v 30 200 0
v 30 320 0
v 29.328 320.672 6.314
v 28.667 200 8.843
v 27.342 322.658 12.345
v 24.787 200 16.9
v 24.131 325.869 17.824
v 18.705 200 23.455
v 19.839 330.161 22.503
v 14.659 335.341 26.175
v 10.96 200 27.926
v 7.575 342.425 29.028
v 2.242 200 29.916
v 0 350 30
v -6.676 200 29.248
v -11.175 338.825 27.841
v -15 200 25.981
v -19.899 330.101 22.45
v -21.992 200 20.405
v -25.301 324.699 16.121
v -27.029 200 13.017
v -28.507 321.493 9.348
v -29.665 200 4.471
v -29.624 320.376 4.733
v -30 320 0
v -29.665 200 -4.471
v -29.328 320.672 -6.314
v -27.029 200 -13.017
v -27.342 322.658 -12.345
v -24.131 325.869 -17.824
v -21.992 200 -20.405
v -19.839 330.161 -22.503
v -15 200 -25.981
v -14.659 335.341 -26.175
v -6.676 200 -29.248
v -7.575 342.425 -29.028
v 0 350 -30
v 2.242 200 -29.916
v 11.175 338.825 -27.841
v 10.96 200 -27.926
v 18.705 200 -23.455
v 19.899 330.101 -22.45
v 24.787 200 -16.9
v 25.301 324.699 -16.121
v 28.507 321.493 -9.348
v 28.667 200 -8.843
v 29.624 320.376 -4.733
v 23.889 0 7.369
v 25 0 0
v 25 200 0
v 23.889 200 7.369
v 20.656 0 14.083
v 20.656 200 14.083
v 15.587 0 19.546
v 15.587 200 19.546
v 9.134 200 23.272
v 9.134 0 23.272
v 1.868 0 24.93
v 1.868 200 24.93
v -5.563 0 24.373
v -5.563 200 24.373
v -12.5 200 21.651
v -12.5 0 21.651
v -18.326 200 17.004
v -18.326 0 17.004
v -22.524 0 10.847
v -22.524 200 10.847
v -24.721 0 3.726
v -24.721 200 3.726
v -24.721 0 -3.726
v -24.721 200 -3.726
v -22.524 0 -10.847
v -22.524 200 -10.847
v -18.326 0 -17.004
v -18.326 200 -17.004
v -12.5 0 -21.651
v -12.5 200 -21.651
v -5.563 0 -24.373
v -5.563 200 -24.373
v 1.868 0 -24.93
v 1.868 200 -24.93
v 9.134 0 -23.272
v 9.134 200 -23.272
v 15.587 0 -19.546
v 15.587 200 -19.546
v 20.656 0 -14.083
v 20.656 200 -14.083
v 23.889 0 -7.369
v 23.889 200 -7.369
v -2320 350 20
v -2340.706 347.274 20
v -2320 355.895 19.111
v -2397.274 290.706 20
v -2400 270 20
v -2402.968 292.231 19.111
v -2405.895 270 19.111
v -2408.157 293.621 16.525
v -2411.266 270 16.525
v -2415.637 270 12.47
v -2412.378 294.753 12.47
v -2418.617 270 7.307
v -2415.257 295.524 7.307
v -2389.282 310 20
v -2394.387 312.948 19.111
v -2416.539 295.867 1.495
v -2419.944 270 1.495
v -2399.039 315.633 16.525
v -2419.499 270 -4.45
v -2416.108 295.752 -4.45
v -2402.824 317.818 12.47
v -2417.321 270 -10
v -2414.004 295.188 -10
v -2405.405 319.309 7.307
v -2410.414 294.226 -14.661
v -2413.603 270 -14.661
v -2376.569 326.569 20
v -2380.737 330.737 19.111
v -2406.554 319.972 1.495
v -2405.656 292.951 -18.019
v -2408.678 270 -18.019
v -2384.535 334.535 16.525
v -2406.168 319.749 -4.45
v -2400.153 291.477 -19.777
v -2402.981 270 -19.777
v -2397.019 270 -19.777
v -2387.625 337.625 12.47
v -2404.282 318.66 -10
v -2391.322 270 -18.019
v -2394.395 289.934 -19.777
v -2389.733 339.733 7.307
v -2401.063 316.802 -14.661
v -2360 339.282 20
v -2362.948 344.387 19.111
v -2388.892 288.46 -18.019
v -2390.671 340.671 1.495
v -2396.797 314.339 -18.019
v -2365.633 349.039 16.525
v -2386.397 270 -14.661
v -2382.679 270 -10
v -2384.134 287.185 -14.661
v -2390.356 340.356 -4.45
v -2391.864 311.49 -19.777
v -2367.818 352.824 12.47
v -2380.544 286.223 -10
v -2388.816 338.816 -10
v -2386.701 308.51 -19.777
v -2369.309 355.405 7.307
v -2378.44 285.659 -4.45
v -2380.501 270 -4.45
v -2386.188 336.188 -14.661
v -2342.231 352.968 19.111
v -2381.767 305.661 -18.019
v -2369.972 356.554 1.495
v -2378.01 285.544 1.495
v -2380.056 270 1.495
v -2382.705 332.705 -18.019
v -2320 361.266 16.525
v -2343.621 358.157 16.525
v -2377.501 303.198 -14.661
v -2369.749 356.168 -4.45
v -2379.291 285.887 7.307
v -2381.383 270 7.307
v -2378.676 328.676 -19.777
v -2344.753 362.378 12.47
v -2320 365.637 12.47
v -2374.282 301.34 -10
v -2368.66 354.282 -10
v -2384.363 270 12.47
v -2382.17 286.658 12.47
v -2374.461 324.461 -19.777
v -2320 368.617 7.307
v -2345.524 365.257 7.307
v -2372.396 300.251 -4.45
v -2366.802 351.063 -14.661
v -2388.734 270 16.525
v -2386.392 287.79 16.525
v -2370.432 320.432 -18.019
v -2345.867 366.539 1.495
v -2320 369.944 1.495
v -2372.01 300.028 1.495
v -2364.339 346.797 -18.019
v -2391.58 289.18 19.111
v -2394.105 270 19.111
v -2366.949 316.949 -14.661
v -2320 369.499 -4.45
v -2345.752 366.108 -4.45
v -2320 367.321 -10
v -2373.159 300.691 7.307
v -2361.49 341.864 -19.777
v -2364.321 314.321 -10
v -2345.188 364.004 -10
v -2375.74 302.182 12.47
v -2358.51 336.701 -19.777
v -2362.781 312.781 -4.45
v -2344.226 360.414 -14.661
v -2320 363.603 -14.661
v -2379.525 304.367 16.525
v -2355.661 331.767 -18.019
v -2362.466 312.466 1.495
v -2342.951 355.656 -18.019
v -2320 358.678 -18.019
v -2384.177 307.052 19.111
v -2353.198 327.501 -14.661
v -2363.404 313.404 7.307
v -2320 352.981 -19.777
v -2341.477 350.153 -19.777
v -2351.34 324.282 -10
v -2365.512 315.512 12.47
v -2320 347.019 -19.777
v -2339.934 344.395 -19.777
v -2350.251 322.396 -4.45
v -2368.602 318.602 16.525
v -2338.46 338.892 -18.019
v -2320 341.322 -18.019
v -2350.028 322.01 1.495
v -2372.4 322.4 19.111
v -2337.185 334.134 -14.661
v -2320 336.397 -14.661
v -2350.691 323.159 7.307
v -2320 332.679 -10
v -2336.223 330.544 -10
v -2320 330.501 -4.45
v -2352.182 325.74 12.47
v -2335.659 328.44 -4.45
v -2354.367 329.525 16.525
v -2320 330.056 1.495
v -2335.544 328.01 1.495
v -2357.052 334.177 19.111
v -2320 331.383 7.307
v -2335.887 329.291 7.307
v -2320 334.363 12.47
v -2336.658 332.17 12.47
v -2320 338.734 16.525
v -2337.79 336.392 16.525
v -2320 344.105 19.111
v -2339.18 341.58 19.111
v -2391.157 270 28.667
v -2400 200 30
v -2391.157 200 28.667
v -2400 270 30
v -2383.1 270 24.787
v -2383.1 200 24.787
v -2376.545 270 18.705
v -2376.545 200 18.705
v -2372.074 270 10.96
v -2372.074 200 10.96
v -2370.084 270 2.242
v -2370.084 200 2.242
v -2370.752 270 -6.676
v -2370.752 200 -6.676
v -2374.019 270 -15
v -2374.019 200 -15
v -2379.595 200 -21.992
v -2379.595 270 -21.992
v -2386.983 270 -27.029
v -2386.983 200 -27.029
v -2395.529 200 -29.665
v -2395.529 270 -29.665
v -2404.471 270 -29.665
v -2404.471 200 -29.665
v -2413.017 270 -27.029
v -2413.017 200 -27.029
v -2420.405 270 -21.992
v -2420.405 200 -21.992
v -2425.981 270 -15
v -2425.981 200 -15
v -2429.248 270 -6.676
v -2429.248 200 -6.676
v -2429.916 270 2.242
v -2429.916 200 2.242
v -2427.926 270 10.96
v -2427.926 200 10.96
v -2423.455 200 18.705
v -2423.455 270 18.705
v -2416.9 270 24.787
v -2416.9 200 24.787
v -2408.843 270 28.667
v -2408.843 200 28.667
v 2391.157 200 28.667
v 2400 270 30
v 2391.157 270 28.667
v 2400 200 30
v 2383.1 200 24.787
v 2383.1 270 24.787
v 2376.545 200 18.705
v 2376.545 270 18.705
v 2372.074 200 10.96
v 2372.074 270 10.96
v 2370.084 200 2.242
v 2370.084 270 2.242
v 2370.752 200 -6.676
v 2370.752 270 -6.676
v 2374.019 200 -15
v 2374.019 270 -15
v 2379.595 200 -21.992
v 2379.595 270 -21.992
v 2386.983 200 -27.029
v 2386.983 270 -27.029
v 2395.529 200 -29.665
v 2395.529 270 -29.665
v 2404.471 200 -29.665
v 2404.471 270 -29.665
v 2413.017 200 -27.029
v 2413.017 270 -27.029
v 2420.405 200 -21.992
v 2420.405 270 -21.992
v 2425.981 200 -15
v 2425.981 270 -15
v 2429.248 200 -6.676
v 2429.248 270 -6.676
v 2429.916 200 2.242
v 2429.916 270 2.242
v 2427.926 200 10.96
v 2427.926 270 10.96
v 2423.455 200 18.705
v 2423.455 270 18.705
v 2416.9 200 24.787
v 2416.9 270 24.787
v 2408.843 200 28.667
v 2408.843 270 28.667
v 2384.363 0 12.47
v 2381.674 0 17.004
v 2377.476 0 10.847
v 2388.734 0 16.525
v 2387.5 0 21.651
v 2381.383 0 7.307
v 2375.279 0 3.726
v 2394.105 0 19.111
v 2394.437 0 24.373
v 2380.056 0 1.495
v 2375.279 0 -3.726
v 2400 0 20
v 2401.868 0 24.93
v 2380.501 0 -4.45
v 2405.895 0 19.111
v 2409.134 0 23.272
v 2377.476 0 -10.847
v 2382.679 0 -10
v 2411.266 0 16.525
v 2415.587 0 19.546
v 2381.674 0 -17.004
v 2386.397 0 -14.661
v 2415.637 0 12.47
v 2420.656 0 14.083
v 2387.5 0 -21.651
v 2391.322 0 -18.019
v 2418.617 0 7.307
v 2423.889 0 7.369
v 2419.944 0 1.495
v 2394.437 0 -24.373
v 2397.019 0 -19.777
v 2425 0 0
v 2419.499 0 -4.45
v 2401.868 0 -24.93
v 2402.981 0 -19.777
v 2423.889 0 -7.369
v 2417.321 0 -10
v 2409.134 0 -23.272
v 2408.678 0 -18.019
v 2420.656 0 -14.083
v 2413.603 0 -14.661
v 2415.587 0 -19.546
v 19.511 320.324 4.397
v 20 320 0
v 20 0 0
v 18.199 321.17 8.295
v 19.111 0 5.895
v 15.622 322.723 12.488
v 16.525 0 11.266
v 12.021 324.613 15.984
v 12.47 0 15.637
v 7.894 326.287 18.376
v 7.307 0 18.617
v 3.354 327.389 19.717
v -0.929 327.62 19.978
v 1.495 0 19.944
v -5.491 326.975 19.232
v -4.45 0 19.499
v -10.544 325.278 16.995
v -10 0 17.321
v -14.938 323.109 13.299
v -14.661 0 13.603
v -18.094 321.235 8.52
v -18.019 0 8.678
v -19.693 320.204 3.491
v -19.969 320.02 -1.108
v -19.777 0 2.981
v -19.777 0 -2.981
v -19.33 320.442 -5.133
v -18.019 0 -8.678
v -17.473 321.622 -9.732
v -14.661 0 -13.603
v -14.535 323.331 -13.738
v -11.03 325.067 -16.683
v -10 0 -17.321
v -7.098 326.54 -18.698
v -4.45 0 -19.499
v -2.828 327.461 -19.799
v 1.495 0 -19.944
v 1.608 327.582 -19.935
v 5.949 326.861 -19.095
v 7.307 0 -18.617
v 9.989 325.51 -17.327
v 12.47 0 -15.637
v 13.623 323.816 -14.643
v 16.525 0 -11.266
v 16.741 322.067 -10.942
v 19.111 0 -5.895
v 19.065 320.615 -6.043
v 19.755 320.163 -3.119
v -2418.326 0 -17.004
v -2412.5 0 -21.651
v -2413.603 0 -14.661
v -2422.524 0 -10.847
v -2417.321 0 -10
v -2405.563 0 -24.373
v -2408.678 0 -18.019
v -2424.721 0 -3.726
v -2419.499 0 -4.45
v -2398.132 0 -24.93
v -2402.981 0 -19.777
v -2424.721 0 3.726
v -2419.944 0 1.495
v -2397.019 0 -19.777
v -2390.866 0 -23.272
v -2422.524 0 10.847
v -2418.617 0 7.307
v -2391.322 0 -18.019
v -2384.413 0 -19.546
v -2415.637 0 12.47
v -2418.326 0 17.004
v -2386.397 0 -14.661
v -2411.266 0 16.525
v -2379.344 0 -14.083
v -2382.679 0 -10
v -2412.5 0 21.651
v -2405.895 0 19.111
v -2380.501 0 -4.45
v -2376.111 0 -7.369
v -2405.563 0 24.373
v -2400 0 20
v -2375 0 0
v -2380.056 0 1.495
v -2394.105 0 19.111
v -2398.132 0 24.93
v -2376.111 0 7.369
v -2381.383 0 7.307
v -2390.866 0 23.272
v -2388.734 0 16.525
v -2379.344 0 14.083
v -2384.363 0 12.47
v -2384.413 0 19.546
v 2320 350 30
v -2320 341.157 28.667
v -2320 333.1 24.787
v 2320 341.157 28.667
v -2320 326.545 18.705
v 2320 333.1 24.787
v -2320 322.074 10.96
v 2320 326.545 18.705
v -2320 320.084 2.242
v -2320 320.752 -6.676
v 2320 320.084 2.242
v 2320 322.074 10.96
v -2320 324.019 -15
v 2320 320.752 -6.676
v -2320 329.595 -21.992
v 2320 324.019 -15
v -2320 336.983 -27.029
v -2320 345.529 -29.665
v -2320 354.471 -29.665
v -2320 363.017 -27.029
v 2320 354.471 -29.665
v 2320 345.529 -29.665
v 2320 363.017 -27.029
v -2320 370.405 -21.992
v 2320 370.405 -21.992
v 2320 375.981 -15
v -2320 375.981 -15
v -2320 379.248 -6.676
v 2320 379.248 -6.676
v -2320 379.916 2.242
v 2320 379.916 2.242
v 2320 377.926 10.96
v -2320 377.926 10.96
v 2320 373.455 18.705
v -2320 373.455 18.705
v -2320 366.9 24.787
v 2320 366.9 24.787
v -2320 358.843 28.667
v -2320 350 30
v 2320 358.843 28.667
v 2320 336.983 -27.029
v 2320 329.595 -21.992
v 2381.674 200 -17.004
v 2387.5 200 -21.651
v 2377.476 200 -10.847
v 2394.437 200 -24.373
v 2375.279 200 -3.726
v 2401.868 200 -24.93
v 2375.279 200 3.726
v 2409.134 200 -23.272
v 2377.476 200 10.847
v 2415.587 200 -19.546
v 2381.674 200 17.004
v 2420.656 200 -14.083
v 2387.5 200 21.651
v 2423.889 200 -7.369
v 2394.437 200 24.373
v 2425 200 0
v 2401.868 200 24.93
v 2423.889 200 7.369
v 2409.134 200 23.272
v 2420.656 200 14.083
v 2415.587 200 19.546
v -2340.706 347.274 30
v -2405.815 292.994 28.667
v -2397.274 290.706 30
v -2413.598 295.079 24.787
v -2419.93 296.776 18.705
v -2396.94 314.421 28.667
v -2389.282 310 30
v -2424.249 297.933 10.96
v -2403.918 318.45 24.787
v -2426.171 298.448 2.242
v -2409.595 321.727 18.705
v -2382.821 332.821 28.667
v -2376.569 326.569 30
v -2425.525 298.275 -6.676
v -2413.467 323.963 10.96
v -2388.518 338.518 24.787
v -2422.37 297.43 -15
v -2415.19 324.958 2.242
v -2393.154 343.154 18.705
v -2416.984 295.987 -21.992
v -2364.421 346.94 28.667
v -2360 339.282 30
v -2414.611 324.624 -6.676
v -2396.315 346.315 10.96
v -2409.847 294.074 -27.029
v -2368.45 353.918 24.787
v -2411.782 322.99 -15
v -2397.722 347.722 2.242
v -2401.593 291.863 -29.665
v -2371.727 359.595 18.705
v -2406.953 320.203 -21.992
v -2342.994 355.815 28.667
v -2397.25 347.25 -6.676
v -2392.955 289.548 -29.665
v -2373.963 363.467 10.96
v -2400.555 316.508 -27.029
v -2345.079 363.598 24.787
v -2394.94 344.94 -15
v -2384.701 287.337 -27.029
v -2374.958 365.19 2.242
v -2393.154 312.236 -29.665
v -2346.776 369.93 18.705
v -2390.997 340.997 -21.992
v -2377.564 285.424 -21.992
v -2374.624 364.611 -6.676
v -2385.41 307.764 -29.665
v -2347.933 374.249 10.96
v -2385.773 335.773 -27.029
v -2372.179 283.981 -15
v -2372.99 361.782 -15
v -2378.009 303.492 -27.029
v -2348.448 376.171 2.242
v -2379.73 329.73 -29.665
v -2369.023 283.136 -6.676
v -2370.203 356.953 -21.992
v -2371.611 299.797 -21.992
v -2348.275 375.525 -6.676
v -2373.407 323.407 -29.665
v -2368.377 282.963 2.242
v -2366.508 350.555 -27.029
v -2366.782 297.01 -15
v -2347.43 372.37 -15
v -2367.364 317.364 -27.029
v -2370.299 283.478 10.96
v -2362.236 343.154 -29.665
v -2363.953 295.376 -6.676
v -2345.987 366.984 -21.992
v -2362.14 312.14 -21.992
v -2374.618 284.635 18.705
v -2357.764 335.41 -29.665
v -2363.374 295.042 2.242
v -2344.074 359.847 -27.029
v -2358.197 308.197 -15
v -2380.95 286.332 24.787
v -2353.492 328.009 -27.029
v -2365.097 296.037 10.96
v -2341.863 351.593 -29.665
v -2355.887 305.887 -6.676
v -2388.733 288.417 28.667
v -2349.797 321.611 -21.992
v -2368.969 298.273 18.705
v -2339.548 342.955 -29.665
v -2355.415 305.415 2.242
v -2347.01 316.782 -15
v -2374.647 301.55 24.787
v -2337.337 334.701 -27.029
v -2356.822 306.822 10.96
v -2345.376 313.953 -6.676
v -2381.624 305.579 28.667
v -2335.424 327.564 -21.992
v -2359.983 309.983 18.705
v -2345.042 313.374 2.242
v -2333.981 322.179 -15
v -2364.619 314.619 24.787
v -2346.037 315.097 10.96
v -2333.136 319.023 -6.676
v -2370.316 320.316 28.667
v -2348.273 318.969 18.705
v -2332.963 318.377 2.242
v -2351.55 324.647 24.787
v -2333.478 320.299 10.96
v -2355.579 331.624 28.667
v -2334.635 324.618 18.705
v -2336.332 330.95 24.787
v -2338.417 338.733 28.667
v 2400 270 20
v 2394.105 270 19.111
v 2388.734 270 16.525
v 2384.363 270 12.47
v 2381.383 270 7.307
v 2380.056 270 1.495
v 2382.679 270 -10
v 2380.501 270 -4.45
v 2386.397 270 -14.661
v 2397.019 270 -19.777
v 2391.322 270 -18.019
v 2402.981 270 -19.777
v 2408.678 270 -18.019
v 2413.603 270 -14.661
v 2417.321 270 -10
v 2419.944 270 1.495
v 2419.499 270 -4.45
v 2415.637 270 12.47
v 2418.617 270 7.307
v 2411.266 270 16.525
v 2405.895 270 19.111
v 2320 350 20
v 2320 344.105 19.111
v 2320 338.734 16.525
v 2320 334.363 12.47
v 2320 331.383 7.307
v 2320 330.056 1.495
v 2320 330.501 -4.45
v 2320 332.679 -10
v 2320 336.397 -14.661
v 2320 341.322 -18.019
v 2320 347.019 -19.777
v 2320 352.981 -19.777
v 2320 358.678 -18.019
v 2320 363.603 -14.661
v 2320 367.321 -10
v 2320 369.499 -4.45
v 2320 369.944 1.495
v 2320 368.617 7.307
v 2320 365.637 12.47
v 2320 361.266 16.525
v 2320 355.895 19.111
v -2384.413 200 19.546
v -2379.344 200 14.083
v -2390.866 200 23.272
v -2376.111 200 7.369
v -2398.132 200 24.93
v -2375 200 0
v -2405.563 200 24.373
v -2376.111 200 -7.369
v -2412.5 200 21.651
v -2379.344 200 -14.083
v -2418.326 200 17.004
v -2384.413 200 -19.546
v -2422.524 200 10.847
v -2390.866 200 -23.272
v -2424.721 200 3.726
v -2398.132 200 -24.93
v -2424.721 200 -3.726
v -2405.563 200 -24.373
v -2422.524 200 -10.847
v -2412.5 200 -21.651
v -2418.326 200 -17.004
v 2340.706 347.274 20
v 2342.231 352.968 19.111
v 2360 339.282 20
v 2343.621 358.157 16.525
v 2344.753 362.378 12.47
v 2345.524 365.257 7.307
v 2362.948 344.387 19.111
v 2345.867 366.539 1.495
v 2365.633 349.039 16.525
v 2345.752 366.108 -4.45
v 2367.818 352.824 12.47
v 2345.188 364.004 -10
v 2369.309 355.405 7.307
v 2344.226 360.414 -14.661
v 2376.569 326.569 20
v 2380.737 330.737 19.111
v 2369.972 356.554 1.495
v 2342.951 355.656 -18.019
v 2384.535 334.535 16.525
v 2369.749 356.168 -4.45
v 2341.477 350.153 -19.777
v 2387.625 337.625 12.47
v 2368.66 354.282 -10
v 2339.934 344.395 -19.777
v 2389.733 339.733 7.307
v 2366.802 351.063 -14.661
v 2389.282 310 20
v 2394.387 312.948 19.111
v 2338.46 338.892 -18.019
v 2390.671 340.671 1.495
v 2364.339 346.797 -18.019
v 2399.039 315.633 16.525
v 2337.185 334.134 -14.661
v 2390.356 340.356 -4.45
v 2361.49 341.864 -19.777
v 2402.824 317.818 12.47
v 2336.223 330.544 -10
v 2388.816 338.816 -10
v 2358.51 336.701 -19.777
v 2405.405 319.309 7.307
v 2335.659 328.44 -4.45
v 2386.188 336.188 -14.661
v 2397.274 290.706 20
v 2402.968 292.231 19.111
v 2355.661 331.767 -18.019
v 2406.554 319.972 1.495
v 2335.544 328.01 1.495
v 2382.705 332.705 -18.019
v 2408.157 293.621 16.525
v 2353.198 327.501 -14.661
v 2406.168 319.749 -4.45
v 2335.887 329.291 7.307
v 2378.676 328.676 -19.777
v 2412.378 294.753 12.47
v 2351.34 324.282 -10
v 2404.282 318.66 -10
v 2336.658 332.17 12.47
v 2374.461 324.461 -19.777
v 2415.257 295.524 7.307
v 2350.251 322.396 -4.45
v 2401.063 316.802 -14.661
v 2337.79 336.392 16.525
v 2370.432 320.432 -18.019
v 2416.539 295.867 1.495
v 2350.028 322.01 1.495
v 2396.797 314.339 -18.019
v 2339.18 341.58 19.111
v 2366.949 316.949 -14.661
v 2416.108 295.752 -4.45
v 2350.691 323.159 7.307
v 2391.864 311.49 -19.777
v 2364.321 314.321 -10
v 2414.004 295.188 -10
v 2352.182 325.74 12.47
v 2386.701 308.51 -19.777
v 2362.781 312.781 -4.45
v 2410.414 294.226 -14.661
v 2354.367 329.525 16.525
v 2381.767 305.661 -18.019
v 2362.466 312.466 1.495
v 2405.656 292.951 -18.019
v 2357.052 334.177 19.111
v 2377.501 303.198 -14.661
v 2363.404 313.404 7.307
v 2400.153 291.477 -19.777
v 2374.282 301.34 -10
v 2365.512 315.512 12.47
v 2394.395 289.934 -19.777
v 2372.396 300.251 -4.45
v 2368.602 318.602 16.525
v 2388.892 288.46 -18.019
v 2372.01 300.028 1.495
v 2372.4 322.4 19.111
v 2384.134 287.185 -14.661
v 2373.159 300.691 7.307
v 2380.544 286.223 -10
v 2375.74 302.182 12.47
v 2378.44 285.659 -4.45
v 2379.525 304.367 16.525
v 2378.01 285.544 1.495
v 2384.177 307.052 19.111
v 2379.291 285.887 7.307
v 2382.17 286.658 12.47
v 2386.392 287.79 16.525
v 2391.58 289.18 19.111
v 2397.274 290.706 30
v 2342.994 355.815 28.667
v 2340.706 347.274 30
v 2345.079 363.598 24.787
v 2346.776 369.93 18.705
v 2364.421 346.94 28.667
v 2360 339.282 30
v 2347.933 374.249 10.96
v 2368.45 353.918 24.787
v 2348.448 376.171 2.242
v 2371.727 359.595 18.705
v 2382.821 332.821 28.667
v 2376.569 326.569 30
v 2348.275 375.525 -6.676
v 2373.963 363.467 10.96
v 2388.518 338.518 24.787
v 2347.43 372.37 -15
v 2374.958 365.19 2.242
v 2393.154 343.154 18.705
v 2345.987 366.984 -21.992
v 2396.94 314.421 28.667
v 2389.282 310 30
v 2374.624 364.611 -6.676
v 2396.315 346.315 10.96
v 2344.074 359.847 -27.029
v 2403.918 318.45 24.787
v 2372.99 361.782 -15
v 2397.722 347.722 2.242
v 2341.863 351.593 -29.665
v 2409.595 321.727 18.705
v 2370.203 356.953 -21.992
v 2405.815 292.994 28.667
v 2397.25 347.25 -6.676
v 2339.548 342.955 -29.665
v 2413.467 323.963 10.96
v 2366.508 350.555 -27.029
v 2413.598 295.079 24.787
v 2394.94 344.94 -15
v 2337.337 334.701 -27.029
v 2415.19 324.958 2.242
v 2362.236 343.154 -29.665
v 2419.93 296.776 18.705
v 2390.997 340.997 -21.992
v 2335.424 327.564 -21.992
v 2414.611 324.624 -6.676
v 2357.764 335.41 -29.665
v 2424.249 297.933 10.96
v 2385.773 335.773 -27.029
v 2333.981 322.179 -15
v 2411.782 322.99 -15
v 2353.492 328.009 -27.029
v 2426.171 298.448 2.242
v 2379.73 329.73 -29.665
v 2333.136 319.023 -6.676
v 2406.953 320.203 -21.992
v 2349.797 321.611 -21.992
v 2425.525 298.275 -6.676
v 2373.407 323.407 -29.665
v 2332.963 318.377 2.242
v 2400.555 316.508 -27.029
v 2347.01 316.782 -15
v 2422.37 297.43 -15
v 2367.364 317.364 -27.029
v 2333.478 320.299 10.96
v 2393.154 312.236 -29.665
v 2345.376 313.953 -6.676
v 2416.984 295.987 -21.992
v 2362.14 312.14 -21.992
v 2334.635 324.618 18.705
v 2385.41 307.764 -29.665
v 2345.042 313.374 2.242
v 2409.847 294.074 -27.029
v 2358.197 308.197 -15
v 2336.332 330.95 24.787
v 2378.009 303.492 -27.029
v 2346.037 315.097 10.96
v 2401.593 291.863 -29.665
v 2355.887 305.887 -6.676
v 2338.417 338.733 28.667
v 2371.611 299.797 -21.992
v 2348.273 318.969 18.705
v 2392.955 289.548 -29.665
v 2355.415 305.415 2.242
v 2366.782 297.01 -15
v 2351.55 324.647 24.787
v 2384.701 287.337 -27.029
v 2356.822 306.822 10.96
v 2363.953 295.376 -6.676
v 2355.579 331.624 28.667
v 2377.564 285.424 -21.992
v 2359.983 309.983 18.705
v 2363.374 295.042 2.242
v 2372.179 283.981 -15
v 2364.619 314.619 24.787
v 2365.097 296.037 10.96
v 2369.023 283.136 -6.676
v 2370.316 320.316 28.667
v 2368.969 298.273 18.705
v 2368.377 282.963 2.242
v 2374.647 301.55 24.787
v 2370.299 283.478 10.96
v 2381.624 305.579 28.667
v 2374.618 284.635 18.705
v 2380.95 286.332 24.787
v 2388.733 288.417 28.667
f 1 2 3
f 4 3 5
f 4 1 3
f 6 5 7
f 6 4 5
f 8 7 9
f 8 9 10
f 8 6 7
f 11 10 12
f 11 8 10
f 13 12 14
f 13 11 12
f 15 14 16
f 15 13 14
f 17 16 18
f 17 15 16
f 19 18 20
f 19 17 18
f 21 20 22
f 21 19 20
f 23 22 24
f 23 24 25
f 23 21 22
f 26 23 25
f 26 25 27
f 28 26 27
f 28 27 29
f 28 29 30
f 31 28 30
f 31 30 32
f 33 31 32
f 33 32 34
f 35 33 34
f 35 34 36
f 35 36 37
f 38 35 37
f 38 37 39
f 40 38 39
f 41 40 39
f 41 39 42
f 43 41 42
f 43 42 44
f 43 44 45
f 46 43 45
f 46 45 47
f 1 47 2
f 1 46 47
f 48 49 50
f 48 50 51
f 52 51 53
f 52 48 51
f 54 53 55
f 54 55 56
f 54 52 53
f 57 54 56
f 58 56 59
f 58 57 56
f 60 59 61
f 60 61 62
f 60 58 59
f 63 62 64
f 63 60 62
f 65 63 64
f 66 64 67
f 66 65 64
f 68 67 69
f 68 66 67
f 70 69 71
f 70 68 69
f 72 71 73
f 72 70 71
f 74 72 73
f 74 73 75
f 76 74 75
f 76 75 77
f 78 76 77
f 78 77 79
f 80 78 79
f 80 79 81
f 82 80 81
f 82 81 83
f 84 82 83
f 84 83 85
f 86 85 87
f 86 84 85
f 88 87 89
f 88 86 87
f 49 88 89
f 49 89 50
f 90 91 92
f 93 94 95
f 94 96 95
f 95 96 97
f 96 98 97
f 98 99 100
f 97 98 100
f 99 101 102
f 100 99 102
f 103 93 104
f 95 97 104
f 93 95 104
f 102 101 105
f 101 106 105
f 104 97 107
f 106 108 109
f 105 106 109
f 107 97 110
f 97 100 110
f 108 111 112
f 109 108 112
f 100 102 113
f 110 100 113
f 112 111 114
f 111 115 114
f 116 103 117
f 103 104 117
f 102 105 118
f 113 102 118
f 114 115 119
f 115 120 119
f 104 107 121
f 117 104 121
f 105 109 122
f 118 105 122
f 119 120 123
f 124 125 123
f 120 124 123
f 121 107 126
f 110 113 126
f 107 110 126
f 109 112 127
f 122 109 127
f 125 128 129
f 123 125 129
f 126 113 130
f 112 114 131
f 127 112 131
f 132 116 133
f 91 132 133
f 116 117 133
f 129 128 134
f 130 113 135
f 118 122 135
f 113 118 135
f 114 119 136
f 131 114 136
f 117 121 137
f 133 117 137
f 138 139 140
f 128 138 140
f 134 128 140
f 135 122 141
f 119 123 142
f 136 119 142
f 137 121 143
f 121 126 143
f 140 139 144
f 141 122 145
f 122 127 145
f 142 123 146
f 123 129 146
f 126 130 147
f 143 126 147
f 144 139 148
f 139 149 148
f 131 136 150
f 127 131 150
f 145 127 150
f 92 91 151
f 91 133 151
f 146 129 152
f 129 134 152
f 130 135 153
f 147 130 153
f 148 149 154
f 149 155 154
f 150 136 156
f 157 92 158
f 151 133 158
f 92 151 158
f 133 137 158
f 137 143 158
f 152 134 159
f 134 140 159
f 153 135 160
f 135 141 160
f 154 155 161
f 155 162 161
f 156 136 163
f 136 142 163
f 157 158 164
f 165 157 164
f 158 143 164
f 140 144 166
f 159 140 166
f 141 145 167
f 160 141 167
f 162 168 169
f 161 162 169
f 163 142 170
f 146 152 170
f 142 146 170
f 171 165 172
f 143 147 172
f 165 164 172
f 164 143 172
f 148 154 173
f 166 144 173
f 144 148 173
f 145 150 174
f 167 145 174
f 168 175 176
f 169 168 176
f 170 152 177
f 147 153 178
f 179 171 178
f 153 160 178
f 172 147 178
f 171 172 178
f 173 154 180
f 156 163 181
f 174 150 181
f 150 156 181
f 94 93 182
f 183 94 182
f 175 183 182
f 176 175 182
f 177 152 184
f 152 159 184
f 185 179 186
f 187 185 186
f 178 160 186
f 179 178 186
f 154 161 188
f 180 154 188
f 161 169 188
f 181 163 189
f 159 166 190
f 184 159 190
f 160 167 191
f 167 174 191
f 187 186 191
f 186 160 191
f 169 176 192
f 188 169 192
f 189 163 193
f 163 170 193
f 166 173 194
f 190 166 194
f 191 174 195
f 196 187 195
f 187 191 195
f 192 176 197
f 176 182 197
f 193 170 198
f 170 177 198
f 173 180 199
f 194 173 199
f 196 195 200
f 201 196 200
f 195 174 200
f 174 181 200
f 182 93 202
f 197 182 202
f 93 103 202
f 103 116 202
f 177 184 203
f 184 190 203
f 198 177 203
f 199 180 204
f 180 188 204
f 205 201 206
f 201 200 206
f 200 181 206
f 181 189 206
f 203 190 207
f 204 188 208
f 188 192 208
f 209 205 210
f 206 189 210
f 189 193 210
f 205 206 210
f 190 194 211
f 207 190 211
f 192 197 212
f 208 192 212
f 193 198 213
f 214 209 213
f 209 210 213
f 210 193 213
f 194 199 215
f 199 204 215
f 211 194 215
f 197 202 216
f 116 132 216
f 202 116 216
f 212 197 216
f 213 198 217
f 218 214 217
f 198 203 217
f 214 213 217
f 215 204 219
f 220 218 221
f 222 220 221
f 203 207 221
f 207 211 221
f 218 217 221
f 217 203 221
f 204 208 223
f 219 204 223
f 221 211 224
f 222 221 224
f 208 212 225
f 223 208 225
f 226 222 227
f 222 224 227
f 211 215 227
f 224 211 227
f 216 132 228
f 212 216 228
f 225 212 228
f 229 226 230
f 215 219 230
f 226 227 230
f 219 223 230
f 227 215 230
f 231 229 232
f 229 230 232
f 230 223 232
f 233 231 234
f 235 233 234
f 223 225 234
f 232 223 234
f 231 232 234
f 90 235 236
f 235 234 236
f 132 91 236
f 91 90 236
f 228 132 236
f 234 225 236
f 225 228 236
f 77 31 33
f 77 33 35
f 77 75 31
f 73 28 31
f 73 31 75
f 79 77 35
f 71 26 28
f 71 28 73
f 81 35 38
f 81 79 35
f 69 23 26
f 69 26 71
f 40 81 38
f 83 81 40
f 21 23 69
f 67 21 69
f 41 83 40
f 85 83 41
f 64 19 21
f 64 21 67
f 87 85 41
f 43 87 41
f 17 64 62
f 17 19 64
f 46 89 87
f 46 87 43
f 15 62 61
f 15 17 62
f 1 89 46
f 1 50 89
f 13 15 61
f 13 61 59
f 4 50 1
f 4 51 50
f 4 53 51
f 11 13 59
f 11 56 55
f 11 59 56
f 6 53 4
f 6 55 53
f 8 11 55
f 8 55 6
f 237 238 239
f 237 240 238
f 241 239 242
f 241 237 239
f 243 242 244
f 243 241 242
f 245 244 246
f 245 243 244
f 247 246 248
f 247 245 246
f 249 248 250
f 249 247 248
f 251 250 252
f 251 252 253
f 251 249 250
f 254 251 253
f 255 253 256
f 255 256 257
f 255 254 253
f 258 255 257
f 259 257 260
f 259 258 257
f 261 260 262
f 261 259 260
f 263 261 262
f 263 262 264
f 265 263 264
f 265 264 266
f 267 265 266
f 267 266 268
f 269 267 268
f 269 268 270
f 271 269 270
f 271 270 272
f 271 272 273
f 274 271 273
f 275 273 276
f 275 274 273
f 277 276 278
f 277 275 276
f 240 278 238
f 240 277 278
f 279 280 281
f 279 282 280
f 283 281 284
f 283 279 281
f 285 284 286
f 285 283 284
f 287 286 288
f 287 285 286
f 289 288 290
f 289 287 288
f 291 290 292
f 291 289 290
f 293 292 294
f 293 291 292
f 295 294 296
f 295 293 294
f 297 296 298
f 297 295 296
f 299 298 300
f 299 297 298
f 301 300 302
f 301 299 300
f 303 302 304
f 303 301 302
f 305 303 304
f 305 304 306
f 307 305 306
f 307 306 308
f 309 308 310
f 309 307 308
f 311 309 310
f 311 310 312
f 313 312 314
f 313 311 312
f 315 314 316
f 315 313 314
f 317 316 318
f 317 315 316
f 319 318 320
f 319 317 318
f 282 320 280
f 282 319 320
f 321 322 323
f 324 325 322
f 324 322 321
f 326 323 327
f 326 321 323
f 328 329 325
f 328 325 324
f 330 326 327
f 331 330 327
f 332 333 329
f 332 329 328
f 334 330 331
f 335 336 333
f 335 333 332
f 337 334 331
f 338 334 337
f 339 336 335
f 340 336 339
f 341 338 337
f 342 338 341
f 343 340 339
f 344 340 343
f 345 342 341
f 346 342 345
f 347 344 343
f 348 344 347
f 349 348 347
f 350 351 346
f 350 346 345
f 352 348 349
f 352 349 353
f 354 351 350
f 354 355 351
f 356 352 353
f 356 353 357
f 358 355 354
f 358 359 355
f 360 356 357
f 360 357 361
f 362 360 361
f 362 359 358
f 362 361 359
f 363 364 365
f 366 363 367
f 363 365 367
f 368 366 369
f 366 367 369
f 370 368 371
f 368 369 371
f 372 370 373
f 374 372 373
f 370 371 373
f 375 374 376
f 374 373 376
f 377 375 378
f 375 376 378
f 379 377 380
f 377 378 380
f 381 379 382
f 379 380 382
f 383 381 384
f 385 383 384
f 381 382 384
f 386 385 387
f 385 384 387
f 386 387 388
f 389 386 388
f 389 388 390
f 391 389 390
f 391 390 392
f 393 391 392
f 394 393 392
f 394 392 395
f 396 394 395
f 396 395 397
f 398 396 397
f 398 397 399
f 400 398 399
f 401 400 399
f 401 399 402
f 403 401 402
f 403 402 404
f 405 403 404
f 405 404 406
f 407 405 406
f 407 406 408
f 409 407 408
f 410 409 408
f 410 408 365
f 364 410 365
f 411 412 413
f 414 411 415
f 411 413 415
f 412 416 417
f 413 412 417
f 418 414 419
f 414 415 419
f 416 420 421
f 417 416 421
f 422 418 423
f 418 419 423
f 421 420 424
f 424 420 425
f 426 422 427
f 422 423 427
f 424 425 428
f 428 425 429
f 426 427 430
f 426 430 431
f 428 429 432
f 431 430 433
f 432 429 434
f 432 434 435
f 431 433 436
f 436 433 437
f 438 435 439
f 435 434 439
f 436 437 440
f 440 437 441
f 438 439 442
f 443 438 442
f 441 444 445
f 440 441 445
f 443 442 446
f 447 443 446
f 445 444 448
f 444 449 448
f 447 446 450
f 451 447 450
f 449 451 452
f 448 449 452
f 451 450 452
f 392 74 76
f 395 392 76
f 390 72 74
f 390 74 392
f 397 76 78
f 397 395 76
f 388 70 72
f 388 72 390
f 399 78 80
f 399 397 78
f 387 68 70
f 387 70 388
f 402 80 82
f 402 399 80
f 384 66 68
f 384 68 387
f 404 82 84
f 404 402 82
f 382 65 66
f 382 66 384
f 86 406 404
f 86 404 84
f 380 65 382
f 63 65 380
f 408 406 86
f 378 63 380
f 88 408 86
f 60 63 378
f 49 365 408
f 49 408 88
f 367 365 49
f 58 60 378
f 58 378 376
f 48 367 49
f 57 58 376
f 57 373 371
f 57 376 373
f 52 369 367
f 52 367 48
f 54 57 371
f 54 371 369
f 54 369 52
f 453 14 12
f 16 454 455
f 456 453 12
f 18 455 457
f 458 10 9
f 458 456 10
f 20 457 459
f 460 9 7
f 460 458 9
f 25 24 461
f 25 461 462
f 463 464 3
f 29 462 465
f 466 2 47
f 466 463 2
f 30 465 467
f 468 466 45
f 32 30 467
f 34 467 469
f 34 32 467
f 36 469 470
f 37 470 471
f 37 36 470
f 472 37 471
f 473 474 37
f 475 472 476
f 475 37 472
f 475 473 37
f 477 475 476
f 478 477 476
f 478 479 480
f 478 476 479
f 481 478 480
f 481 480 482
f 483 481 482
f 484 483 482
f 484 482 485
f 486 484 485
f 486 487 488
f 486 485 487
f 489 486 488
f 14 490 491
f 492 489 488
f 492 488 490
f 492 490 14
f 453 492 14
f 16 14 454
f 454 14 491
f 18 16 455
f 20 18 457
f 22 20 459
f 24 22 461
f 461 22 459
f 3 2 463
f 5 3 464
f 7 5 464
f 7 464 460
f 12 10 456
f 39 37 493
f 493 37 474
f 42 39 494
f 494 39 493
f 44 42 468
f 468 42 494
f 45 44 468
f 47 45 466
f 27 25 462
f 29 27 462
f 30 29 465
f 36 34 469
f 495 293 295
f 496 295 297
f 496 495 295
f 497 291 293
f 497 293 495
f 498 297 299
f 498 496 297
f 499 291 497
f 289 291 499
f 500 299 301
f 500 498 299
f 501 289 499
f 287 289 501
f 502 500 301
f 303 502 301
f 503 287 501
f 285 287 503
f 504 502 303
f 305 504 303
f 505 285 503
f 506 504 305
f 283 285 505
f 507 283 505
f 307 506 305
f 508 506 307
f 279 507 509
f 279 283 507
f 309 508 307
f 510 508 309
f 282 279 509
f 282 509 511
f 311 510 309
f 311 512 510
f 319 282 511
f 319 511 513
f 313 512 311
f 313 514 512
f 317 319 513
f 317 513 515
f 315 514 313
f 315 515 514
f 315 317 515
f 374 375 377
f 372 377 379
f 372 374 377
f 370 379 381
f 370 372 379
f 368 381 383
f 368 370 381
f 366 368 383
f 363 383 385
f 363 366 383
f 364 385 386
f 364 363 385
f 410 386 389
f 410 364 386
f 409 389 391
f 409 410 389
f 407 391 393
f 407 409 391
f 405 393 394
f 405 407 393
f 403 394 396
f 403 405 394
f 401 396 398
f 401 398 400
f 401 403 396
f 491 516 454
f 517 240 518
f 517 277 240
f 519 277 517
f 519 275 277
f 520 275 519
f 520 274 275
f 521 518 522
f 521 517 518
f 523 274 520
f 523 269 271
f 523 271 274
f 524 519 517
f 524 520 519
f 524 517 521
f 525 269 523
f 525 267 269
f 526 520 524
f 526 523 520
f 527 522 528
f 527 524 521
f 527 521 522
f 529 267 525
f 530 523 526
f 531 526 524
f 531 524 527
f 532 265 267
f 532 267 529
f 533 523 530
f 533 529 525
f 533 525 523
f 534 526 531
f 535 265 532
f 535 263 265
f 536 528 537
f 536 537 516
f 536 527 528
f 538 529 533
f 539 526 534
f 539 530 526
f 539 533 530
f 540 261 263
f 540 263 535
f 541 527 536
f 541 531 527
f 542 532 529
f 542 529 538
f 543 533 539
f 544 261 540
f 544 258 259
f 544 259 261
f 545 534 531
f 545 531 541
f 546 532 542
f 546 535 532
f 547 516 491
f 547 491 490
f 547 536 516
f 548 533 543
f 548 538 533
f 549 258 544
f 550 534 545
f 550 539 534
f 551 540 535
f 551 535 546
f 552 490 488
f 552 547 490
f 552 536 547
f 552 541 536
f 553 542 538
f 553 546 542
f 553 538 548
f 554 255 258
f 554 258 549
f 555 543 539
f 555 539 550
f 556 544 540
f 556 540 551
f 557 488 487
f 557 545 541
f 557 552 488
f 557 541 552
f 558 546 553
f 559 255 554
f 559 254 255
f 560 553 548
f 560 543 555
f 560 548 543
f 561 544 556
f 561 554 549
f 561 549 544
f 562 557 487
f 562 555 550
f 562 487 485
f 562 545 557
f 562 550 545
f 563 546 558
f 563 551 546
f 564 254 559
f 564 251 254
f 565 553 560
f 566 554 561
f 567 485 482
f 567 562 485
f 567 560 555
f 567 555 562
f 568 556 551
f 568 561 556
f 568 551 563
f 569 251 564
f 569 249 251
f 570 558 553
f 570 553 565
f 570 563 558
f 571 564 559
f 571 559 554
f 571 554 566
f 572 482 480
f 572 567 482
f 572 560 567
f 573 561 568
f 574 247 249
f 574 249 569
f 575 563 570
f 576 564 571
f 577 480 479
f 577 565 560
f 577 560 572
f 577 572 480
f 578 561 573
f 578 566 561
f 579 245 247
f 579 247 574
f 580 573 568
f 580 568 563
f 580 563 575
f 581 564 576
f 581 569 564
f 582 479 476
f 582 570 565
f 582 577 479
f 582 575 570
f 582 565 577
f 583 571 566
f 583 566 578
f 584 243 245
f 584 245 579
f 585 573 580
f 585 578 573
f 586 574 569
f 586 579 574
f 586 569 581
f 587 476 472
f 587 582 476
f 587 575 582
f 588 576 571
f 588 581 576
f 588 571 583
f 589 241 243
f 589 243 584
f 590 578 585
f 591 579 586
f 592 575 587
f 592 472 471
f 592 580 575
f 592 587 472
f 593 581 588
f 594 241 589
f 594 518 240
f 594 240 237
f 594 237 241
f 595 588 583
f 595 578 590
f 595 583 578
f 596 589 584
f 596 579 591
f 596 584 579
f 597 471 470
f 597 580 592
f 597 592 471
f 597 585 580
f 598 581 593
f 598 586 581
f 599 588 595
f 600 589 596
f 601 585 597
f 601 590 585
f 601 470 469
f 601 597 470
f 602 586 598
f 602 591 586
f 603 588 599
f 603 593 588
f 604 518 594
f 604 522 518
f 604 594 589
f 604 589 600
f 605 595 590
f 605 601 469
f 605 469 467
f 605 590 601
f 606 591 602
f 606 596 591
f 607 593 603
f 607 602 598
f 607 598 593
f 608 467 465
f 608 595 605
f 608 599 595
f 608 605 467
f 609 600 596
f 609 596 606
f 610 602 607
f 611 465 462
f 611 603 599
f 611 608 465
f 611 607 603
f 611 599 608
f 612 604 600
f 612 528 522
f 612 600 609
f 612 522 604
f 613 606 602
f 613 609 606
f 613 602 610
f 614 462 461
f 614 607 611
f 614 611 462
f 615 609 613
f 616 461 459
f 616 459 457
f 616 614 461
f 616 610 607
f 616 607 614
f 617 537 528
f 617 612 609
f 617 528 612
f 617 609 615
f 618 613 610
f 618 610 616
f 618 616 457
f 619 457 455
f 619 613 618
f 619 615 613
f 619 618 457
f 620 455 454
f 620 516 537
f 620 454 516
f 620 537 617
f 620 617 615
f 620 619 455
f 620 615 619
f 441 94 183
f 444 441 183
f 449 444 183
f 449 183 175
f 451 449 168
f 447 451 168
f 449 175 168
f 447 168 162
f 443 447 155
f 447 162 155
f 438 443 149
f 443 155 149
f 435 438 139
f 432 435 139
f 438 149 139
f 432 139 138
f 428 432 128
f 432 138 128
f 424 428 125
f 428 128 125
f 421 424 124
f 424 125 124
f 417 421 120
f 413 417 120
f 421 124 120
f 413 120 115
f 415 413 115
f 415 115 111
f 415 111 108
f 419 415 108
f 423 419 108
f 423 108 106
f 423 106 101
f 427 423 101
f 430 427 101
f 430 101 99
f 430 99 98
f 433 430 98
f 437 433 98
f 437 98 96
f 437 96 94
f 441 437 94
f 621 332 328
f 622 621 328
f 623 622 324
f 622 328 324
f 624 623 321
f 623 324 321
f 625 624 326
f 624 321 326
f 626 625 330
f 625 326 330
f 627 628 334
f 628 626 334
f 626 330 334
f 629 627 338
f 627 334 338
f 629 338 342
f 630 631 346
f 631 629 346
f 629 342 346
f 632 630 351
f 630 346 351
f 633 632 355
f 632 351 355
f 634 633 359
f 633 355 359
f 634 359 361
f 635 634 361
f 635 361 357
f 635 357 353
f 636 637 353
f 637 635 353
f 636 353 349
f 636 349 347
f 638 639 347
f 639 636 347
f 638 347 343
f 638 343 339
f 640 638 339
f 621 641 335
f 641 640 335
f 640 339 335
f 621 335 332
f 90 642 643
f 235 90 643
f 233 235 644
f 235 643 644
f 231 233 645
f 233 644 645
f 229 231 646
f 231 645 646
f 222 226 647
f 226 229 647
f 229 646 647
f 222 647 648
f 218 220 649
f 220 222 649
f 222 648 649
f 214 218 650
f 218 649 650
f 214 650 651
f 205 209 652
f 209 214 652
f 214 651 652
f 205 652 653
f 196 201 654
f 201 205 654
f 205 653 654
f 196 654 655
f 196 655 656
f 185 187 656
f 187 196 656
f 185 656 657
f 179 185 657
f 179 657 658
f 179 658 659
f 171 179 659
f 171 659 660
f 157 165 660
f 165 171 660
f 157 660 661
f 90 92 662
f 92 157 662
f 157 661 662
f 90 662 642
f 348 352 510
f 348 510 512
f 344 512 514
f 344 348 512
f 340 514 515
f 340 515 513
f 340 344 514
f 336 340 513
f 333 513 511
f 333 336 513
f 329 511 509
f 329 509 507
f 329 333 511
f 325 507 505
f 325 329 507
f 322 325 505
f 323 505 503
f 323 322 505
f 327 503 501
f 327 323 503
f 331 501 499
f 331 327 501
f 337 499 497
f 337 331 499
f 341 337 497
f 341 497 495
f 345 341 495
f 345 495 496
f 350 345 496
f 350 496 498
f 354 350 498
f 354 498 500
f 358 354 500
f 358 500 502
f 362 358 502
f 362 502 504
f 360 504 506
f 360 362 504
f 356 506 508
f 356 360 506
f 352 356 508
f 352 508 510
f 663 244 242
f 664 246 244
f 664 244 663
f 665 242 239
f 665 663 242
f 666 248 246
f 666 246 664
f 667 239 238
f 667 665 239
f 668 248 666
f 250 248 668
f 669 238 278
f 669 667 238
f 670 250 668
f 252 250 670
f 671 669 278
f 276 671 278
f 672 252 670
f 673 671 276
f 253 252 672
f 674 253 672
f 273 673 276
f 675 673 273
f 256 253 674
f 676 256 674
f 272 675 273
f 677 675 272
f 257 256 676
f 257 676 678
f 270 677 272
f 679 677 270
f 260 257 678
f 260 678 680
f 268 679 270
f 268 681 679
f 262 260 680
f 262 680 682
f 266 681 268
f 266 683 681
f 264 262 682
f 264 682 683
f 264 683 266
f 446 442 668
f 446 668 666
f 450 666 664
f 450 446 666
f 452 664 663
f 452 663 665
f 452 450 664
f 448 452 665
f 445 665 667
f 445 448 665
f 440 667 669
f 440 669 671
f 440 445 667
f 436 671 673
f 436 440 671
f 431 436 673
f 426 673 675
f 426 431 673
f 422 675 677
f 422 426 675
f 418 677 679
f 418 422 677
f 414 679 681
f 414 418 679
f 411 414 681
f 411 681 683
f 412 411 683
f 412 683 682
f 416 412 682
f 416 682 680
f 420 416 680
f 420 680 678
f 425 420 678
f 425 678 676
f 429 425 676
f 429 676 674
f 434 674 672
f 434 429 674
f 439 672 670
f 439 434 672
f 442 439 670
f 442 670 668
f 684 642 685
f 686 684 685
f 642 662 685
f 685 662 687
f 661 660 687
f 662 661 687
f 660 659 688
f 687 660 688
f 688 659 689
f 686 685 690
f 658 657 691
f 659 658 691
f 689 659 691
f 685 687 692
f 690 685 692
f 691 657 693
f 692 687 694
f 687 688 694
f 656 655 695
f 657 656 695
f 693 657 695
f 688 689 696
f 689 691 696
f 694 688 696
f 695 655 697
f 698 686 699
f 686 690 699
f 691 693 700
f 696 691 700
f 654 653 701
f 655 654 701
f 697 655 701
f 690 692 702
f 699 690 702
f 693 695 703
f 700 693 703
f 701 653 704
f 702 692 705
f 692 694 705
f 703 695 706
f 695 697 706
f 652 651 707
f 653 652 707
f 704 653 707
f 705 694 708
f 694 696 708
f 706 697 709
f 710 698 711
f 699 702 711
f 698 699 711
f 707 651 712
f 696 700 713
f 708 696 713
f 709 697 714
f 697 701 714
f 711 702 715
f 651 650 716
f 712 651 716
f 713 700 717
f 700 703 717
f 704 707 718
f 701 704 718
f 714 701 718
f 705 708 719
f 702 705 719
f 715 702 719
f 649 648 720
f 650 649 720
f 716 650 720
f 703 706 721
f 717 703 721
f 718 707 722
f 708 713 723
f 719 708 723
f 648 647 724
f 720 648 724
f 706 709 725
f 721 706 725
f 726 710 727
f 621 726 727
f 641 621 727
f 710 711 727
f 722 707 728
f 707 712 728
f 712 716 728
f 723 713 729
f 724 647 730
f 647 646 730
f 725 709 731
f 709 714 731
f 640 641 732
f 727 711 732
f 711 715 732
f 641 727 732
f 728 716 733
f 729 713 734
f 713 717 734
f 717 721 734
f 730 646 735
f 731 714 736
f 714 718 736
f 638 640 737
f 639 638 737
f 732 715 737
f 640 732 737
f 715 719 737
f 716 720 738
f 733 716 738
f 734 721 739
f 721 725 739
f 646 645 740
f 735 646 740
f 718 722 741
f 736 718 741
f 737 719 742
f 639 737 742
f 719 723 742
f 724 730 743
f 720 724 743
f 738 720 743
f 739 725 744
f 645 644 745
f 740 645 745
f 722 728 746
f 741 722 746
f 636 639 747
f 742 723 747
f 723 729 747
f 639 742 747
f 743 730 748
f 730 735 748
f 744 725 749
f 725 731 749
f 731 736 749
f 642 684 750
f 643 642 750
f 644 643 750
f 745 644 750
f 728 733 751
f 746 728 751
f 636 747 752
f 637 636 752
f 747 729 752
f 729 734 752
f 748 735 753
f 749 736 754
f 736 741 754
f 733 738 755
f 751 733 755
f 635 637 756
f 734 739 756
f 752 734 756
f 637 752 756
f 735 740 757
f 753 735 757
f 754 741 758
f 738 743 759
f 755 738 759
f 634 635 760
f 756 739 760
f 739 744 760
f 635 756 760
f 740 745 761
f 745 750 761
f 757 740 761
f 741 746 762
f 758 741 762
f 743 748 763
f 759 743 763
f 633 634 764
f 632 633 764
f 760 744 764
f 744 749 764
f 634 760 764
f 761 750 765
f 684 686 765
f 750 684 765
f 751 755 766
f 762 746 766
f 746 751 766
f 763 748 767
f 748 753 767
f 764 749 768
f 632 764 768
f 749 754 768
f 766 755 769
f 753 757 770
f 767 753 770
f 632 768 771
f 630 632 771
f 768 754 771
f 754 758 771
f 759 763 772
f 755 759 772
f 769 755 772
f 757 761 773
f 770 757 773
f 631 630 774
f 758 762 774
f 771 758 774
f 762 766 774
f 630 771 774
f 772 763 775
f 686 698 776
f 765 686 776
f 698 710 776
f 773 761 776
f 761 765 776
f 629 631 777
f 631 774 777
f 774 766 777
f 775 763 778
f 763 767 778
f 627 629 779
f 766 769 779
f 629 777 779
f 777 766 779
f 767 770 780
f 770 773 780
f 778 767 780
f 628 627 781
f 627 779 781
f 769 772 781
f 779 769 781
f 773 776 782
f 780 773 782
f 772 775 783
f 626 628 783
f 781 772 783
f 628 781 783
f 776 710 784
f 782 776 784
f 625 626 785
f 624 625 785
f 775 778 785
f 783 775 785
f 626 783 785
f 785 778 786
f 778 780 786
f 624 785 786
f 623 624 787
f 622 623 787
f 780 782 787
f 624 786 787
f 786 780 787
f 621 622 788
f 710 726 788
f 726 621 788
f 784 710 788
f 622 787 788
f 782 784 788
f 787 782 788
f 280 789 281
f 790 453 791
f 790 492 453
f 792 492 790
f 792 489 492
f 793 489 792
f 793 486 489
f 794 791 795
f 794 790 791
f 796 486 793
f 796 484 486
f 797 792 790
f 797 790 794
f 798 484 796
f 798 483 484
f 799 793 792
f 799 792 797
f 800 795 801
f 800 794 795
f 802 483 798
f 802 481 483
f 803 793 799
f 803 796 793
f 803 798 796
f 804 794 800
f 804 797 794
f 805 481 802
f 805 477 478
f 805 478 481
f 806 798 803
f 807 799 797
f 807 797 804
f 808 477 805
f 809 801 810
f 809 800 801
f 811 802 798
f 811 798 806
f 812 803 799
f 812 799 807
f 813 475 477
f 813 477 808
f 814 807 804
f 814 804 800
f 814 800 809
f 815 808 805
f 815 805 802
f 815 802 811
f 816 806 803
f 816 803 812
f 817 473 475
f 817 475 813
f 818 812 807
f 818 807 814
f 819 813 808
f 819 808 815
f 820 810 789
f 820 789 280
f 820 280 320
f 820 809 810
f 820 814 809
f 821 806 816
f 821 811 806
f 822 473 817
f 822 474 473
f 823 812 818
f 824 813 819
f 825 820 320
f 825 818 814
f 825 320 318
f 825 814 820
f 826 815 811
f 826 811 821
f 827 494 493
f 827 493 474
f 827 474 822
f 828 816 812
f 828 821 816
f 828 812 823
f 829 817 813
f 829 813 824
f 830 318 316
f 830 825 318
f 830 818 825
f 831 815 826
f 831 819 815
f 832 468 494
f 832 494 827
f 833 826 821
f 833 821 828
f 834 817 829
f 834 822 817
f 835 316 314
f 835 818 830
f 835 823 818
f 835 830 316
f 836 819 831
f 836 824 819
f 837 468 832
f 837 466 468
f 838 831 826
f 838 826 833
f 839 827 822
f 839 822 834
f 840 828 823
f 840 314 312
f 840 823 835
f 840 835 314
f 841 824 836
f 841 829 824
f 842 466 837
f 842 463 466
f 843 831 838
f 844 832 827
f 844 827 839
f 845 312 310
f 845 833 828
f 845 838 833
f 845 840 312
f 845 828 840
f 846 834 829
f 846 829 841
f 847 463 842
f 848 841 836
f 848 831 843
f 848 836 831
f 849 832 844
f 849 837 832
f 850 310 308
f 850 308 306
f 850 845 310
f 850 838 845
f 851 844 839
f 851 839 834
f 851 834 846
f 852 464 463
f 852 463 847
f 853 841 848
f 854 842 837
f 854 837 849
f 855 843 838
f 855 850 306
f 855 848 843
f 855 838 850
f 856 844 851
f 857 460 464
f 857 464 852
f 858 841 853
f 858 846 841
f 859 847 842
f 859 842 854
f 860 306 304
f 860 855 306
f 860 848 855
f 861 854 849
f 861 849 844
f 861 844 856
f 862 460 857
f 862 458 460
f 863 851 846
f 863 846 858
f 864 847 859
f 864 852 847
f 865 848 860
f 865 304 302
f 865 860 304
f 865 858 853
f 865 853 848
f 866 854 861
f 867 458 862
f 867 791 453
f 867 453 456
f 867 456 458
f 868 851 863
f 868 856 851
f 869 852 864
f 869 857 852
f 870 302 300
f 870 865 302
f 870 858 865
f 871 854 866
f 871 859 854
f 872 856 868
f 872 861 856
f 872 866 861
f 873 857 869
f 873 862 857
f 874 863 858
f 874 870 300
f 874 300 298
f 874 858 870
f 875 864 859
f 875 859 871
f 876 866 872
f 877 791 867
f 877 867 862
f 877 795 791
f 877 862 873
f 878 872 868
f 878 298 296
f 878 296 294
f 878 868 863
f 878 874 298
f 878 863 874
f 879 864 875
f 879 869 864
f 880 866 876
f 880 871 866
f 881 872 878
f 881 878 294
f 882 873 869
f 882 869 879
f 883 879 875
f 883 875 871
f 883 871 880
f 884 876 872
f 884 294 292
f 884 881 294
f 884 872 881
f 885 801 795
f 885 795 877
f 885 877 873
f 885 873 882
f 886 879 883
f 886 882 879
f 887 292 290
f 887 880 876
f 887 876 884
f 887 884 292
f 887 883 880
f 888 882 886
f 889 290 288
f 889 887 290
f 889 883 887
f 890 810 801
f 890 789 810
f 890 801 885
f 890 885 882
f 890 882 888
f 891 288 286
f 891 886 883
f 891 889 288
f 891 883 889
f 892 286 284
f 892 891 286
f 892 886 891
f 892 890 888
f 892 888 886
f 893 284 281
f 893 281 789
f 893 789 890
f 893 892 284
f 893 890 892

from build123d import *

# Parameters (mm, degrees)
SWEEP_1_PROFILE_R    = 30
SWEEP_1_PROFILE_R_2  = 20
EXTRUDE_1_REACH      = 2461.715
EXTRUDE_1_END_RADIUS = 30
SKETCH_78_R          = 30
SKETCH_78_R_2        = 20
SKETCH_79_R          = 30
SKETCH_79_R_2        = 25
CUT_EXTRUDE_1_DEPTH  = 200


with BuildPart() as part:
    # 扫描-薄件1: sweep along a path in 草图1
    with BuildLine(Plane.XY) as sweep_1_path:
        Line((-2400, 0), (-2400, 270))
        ThreePointArc((-2400, 270), (-2376.568542495, 326.568542495), (-2320, 350))
        Line((-2320, 350), (2320, 350))
        ThreePointArc((2320, 350), (2376.568542495, 326.568542495), (2400, 270))
        Line((2400, 270), (2400, 0))
    # 扫描-薄件1 profile (on start of the path) → 扫描-薄件1 (sweep)
    with BuildSketch(Plane(origin=(-2400, 0, 0), x_dir=(0, 0, 1), z_dir=(0, 1, 0))):
        Circle(SWEEP_1_PROFILE_R)
        Circle(SWEEP_1_PROFILE_R_2, mode=Mode.SUBTRACT)
    sweep(path=sweep_1_path.line)

    # 凸台-拉伸1: up to this cylinder (the profile starts outside it)
    extrude_1_end = Plane(origin=(-29.151472, 350, 0), z_dir=(1, 0, 0)) * Cylinder(EXTRUDE_1_END_RADIUS, 4984.43, mode=Mode.PRIVATE)
    # 草图78 → 凸台-拉伸1 (add, up to the surface)
    with BuildSketch(Plane.XZ, mode=Mode.PRIVATE) as extrude_1_sk1:
        Circle(SKETCH_78_R)
        Circle(SKETCH_78_R_2, mode=Mode.SUBTRACT)
    extrude_1_tool1 = extrude(extrude_1_sk1.sketch, amount=-EXTRUDE_1_REACH, mode=Mode.PRIVATE) - extrude_1_end
    add(extrude_1_tool1.solids().sort_by_distance((-29.151472, 0, 0))[0])

    # 草图79 → 切除-拉伸1 (cut)
    # profile 1 of 3: a face of its own
    with BuildSketch(Plane.XZ):
        with Locations((-2400, 0)):
            Circle(SKETCH_79_R)
        with Locations((-2400, 0)):
            Circle(SKETCH_79_R_2, mode=Mode.SUBTRACT)
    # profile 2 of 3: a face of its own
    with BuildSketch(Plane.XZ):
        Circle(SKETCH_79_R)
        Circle(SKETCH_79_R_2, mode=Mode.SUBTRACT)
    # profile 3 of 3: a face of its own
    with BuildSketch(Plane.XZ):
        with Locations((2400, 0)):
            Circle(SKETCH_79_R)
        with Locations((2400, 0)):
            Circle(SKETCH_79_R_2, mode=Mode.SUBTRACT)
    extrude(amount=-CUT_EXTRUDE_1_DEPTH, mode=Mode.SUBTRACT)


solid = part.part
